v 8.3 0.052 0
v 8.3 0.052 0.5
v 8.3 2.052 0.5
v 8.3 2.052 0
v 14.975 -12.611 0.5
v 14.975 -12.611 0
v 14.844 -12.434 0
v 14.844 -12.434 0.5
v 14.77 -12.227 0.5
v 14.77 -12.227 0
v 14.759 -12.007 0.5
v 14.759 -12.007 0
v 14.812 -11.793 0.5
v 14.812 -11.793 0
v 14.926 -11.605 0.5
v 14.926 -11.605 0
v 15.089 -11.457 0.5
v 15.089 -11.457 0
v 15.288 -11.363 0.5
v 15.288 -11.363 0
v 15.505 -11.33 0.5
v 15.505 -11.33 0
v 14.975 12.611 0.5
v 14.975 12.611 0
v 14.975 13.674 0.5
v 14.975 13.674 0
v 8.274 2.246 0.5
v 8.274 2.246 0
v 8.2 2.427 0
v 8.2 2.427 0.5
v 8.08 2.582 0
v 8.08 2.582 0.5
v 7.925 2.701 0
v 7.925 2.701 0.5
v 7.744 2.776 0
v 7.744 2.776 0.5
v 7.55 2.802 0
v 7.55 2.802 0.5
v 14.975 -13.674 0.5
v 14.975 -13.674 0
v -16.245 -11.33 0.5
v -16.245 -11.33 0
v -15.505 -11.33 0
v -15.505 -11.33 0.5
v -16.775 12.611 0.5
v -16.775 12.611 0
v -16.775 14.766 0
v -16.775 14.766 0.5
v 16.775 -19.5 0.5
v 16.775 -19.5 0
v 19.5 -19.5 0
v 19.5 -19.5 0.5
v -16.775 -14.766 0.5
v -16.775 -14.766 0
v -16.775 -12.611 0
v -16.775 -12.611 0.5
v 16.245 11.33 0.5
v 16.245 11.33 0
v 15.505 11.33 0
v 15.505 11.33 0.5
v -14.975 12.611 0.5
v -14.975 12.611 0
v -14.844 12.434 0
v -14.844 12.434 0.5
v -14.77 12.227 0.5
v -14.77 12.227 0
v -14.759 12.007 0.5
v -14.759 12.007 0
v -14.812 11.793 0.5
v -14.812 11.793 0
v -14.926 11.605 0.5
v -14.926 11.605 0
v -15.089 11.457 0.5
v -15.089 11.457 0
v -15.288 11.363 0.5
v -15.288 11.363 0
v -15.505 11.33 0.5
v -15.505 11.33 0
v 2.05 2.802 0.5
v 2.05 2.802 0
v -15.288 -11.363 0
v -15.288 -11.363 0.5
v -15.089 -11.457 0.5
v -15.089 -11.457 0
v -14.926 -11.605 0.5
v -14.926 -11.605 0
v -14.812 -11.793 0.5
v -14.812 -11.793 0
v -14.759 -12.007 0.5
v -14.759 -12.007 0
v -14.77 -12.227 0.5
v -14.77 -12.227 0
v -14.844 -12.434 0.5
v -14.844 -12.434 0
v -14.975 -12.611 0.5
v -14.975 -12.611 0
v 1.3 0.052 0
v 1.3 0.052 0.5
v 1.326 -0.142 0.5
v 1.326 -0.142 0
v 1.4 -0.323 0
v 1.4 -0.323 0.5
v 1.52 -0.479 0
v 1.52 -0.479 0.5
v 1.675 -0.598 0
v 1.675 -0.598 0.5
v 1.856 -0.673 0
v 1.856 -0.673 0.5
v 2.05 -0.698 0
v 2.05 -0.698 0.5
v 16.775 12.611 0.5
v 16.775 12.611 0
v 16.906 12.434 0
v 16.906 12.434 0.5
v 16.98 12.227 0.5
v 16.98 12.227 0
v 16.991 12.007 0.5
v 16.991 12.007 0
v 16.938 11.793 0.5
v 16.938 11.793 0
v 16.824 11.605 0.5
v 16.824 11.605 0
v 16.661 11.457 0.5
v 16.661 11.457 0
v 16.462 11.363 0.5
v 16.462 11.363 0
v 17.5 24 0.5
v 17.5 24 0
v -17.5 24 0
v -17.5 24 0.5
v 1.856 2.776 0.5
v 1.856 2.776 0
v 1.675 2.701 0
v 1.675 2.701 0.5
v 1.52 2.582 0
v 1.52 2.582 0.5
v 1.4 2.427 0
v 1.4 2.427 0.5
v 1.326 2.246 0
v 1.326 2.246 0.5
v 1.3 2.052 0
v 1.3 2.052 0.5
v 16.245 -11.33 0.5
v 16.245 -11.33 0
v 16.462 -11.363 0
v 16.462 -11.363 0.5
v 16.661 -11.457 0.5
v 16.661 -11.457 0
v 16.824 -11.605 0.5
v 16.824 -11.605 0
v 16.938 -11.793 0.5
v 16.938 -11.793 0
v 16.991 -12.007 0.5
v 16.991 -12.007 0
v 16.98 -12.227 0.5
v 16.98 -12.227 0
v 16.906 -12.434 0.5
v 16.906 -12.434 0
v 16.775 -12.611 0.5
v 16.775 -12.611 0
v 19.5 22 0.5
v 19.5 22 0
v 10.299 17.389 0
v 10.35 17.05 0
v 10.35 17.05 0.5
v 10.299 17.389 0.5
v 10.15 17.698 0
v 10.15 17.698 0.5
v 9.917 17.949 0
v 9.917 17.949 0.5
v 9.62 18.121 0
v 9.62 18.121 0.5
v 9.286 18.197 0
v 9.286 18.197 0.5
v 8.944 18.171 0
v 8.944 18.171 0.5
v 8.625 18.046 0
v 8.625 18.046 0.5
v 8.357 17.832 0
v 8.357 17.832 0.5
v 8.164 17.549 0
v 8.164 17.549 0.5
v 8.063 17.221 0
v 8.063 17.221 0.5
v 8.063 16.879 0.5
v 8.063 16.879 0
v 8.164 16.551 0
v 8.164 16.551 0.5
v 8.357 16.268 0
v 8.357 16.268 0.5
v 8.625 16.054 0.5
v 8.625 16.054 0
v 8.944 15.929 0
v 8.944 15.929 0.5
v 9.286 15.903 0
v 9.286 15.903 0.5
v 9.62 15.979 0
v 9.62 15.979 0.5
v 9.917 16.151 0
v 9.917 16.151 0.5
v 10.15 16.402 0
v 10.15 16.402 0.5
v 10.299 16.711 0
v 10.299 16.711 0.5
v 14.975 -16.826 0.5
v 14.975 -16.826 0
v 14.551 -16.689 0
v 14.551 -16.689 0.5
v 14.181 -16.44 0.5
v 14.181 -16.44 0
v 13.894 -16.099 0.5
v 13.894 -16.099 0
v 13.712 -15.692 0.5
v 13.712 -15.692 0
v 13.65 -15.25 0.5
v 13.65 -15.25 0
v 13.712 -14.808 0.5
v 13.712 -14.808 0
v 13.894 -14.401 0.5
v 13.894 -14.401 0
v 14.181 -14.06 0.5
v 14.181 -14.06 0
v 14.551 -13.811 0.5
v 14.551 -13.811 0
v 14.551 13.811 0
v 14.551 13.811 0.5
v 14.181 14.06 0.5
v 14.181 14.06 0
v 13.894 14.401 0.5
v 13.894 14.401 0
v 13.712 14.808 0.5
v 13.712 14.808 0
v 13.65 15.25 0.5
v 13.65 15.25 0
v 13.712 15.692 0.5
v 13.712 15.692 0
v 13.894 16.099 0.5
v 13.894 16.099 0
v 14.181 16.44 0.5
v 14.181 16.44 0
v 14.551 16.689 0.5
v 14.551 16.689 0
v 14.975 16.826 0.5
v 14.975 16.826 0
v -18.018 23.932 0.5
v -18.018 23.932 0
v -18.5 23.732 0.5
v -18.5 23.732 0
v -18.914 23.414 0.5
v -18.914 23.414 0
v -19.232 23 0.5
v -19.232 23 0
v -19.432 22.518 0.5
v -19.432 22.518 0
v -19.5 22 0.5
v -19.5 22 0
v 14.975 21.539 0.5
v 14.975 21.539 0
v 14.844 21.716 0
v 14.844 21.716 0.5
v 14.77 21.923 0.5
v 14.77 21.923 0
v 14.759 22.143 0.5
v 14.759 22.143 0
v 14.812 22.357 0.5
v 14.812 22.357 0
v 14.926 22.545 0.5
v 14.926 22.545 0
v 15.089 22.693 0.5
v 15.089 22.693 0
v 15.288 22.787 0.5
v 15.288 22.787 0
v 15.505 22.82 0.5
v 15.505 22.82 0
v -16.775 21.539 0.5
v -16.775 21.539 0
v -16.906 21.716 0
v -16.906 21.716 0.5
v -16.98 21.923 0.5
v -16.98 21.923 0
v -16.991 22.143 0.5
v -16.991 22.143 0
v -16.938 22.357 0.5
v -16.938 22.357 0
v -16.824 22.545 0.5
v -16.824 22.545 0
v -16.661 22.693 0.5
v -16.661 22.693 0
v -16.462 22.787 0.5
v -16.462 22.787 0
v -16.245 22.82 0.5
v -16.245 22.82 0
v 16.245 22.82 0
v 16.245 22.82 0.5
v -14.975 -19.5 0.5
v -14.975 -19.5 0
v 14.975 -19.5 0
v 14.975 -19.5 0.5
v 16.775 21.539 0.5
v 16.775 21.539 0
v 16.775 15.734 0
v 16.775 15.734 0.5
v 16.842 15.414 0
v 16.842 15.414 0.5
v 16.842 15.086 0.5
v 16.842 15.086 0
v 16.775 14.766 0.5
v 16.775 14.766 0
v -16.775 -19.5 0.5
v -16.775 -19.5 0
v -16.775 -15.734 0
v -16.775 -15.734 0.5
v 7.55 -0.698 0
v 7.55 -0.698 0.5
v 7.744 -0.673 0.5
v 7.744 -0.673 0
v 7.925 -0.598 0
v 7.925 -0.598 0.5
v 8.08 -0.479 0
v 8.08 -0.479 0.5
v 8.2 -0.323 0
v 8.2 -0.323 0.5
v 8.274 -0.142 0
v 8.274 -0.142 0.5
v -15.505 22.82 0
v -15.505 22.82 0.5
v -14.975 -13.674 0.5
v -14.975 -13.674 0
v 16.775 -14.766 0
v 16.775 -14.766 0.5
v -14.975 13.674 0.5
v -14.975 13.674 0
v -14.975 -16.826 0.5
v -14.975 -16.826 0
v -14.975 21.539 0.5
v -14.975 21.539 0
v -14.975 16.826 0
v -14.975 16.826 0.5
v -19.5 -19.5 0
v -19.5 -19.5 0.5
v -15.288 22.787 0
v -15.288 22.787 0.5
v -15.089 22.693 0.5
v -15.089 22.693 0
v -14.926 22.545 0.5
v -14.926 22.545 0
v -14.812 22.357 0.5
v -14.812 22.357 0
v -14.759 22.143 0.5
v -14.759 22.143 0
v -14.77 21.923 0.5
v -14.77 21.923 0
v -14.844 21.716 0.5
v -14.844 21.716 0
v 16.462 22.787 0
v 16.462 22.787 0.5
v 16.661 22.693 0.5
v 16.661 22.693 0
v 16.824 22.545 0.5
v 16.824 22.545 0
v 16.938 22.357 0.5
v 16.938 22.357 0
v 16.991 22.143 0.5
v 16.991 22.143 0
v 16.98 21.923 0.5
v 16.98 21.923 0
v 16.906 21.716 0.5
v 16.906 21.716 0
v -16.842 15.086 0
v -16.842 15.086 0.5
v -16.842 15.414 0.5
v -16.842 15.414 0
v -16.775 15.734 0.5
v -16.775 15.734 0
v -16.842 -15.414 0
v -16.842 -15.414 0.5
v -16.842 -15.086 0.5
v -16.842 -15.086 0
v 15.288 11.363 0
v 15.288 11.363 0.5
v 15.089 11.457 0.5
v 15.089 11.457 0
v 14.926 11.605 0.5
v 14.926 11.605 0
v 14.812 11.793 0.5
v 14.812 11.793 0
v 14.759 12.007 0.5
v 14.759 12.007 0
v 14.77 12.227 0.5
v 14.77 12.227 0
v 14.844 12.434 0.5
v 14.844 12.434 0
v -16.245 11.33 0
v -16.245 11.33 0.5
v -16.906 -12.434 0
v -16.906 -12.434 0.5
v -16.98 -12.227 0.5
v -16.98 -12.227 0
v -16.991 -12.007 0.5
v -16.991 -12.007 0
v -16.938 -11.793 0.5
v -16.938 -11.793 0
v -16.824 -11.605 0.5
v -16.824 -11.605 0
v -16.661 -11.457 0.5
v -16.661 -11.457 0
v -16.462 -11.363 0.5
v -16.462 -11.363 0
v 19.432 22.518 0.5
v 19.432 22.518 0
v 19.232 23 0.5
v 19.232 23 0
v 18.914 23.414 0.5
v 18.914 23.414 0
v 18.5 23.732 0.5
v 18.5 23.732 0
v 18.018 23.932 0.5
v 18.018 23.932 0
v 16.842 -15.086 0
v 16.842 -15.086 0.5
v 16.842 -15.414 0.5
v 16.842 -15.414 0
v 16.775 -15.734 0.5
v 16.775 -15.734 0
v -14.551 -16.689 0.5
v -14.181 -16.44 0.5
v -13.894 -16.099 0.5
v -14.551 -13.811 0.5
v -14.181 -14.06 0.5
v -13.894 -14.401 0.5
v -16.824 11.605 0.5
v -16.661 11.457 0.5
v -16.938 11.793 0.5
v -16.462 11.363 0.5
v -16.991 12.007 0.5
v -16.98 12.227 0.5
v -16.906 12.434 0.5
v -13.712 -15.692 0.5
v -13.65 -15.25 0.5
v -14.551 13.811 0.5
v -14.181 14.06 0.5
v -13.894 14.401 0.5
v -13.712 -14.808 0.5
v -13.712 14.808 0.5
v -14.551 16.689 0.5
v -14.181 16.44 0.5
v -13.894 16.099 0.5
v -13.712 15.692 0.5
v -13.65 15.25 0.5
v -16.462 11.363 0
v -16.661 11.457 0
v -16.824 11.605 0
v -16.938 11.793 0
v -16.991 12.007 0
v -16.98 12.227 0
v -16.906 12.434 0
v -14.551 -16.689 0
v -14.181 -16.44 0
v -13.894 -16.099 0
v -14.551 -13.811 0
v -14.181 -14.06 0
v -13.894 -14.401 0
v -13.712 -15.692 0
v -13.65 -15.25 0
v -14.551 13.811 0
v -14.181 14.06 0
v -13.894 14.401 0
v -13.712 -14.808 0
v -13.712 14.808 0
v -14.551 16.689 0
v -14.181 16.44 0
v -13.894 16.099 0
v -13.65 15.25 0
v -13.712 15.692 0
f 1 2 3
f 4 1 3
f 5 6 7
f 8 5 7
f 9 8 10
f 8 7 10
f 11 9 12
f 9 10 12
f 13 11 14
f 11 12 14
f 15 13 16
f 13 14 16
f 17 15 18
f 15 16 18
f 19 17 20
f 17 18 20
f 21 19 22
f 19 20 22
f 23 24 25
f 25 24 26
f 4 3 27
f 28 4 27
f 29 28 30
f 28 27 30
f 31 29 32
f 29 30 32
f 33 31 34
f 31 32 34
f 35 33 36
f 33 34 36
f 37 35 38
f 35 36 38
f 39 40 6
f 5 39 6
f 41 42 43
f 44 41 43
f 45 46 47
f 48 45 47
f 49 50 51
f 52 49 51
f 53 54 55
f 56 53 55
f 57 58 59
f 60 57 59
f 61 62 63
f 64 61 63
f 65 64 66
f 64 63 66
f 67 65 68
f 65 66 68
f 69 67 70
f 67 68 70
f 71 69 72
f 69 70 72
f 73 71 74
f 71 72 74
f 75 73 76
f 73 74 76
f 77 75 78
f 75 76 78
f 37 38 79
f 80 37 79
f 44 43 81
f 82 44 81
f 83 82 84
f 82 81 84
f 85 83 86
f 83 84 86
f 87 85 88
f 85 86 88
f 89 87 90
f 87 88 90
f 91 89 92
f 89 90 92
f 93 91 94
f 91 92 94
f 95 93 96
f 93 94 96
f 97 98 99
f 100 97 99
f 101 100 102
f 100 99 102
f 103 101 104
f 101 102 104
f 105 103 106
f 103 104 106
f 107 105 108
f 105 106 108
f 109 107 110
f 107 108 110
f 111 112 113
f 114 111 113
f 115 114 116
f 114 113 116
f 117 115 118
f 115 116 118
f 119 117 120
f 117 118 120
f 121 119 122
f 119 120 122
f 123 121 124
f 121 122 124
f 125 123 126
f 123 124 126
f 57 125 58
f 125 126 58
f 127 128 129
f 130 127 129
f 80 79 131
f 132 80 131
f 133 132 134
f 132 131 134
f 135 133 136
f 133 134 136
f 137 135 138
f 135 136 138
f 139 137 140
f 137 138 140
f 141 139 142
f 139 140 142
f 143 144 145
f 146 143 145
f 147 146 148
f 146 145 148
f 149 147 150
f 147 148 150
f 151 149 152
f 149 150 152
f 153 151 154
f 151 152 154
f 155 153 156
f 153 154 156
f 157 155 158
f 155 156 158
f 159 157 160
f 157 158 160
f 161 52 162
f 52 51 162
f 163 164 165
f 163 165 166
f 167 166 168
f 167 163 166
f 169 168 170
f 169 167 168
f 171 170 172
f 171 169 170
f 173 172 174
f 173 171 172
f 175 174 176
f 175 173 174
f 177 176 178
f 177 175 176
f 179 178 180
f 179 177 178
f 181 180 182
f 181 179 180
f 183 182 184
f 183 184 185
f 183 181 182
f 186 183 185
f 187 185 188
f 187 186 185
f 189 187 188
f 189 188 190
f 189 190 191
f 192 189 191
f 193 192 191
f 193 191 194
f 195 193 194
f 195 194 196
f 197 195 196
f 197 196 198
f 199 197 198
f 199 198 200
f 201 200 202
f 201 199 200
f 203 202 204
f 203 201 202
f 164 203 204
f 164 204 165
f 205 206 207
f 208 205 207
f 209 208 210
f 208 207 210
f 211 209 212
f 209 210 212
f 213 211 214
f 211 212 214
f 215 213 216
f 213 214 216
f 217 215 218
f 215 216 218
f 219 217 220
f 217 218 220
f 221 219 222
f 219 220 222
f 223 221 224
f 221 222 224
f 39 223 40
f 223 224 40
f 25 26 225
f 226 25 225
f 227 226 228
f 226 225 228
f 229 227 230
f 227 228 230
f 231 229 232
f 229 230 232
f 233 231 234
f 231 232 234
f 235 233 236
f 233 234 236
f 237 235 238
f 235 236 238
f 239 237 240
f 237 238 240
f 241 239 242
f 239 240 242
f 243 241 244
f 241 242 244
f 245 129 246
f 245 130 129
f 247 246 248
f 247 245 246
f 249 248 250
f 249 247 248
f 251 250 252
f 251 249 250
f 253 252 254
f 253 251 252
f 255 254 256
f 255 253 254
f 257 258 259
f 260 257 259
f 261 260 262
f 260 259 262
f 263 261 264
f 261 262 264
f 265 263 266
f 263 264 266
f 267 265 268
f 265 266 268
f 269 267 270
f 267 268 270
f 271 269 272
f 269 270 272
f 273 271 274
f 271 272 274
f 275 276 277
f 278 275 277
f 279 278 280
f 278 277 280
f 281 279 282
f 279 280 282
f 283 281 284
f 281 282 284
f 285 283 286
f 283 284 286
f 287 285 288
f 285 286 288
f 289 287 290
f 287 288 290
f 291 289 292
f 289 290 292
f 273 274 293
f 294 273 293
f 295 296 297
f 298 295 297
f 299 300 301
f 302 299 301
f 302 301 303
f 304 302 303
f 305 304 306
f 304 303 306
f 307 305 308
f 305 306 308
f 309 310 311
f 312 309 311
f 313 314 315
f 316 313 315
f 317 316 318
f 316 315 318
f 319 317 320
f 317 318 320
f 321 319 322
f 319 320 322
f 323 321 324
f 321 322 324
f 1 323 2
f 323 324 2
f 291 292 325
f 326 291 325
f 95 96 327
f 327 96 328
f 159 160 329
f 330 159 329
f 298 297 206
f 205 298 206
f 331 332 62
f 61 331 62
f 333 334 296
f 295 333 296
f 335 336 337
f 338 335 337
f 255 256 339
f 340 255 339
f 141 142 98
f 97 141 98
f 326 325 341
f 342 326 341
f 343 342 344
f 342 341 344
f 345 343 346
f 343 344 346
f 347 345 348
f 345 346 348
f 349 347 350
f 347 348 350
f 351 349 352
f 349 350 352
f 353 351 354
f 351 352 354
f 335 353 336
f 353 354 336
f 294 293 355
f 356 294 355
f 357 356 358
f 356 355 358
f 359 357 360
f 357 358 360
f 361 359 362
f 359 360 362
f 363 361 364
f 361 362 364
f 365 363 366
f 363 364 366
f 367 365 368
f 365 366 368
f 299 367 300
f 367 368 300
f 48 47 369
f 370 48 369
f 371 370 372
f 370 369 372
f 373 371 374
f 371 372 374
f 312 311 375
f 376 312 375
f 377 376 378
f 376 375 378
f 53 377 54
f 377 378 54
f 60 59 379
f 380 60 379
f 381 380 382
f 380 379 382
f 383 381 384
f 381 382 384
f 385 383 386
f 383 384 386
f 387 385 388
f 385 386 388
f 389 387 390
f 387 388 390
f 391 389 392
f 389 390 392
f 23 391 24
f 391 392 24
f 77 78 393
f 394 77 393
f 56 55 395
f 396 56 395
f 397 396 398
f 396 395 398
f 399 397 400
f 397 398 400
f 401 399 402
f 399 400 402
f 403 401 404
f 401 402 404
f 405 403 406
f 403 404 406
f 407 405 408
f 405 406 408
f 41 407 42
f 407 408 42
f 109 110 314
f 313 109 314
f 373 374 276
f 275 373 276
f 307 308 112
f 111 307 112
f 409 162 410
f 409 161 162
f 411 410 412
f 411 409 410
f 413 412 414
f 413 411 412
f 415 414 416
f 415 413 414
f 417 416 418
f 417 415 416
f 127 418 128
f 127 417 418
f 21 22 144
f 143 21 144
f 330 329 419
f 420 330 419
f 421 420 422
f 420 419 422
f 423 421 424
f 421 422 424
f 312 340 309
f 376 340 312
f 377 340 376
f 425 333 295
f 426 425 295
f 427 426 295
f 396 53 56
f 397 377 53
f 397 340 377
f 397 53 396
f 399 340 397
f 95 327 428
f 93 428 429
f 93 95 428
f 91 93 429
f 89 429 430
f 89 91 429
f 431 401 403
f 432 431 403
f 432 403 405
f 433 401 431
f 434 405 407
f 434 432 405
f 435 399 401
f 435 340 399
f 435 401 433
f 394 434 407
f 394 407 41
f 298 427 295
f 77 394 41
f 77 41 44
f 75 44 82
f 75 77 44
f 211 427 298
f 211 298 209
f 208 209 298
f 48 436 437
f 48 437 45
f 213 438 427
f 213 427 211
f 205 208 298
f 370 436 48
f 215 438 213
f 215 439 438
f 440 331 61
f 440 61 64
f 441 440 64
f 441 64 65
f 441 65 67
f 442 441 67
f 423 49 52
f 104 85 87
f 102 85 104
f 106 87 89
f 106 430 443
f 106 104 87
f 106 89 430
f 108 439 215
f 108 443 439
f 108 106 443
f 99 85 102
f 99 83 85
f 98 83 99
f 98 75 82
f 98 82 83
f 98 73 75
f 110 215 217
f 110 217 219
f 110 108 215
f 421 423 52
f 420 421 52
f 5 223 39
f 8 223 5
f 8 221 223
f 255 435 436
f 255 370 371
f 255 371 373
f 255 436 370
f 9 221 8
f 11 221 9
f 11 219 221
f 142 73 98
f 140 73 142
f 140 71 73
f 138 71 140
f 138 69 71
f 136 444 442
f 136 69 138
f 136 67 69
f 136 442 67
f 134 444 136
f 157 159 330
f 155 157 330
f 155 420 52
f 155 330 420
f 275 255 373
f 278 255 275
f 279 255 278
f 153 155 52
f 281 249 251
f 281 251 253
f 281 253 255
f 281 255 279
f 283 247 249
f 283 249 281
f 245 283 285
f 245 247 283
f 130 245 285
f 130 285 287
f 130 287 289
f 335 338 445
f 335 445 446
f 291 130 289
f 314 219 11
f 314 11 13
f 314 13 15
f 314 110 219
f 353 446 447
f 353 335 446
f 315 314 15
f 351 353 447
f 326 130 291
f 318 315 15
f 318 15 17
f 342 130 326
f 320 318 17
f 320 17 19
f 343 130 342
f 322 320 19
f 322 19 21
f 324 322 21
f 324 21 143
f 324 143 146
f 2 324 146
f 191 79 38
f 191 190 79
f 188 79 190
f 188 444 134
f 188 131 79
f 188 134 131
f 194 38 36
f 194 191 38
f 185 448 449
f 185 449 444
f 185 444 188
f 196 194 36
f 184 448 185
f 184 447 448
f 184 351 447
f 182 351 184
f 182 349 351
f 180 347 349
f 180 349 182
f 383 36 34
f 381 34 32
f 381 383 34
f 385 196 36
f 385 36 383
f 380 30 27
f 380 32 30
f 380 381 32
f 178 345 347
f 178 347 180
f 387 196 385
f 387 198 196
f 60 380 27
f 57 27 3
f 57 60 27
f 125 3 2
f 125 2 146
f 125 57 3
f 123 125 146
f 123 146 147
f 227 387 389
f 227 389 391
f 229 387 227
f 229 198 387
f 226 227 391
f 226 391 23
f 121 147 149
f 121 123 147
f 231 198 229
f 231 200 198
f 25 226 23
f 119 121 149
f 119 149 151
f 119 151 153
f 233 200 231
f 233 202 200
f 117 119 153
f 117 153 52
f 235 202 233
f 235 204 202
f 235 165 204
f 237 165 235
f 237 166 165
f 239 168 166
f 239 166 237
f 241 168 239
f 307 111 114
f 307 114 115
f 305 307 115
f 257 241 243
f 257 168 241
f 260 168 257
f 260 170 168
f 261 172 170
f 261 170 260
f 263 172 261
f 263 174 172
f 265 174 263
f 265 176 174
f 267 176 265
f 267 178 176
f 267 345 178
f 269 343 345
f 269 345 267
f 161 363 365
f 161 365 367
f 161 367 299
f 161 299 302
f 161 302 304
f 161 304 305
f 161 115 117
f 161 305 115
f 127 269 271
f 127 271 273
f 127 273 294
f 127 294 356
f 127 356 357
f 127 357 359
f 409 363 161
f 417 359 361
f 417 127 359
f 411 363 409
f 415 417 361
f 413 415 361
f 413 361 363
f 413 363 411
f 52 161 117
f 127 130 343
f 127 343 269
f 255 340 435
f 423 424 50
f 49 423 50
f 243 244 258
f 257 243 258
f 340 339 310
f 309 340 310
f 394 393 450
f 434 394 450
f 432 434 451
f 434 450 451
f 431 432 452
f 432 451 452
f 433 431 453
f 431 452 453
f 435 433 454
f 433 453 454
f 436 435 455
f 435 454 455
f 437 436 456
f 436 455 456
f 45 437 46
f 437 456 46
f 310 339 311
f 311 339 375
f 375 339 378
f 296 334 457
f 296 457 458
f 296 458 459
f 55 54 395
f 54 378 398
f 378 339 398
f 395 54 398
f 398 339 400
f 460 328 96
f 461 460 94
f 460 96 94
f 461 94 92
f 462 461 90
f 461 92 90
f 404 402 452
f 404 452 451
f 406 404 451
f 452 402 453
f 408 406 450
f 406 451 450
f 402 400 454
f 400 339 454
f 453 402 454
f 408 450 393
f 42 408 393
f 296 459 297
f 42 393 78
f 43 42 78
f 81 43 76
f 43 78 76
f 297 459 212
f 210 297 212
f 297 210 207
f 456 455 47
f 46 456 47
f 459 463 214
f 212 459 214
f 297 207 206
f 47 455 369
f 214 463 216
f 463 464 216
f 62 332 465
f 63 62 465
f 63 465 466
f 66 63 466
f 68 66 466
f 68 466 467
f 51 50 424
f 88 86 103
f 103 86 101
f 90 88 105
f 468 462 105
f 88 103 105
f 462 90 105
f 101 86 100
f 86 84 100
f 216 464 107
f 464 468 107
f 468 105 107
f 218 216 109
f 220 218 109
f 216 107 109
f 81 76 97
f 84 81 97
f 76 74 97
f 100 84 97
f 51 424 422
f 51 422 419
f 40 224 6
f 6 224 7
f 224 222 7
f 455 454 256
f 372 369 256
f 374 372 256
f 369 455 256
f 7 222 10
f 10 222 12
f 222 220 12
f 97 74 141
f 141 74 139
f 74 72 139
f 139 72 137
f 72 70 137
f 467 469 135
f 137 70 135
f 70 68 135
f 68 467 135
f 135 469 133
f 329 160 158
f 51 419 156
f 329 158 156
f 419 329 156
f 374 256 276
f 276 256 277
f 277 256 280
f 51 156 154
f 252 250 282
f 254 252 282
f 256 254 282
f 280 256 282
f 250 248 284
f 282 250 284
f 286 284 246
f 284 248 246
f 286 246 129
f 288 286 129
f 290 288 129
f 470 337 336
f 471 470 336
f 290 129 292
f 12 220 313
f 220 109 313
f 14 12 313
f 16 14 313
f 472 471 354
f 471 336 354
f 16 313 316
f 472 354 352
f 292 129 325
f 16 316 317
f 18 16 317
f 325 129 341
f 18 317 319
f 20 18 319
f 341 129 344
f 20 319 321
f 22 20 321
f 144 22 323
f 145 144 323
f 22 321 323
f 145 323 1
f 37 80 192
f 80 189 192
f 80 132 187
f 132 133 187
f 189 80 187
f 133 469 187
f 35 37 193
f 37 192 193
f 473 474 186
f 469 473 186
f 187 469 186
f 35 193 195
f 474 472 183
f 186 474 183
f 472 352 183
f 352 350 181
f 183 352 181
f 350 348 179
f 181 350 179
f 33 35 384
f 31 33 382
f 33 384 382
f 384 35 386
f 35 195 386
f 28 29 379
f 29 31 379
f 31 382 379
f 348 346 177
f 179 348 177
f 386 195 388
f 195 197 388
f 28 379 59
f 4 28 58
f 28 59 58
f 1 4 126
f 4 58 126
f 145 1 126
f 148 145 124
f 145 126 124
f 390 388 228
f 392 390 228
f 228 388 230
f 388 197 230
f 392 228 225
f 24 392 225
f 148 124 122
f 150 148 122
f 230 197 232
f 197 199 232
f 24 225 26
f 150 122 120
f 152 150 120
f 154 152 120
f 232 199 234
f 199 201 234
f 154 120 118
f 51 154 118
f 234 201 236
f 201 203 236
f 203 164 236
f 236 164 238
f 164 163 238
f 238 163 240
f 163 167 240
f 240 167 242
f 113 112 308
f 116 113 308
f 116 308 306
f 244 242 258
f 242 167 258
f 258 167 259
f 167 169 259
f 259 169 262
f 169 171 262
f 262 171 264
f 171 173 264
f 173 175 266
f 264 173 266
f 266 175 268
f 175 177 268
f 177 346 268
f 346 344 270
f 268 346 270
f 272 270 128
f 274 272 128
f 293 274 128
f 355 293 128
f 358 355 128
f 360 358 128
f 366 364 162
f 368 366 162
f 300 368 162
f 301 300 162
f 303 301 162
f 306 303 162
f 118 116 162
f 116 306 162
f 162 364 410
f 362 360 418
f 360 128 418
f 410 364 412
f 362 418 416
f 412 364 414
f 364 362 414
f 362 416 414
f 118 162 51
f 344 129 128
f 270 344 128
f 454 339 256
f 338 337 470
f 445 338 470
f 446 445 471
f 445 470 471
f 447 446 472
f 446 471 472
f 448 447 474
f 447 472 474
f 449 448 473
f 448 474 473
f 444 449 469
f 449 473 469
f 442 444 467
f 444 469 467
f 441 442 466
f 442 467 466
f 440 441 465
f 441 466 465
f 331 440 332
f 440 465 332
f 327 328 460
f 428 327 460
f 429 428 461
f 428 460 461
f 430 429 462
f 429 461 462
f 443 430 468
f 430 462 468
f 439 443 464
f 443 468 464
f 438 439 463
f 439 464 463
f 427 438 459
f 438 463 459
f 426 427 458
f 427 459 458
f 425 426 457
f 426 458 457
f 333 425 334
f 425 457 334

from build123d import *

# Parameters (mm, degrees)
SKETCH1_R                   = 1.15
SHAPE_DEPTH                 = 0.5
CAMERA_CONNECTOR_HOLE_REACH = 32.927
FILLET1_R                   = 2


with BuildPart() as part:
    # Sketch1 → Shape (new body)
    with BuildSketch(Plane.XY):
        with BuildLine():
            Line((19.5, 24), (-19.5, 24))
            Line((-19.5, 24), (-19.5, -19.5))
            Line((-19.5, -19.5), (-16.775, -19.5))
            Line((-16.775, -19.5), (-16.775, -15.734122918))
            ThreePointArc((-16.775, -15.734122918), (-16.85, -15.25), (-16.775, -14.765877082))
            Line((-16.775, -14.765877082), (-16.775, -12.610660172))
            ThreePointArc((-16.775, -12.610660172), (-16.937579563, -11.793317512), (-16.244669914, -11.330330086))
            Line((-16.244669914, -11.330330086), (-15.505330086, -11.330330086))
            ThreePointArc((-15.505330086, -11.330330086), (-14.812420437, -11.793317512), (-14.975, -12.610660172))
            Line((-14.975, -12.610660172), (-14.975, -13.673809973))
            ThreePointArc((-14.975, -13.673809973), (-13.65, -15.25), (-14.975, -16.826190027))
            Line((-14.975, -16.826190027), (-14.975, -19.5))
            Line((-14.975, -19.5), (14.975, -19.5))
            Line((14.975, -19.5), (14.975, -16.826190027))
            ThreePointArc((14.975, -16.826190027), (13.65, -15.25), (14.975, -13.673809973))
            Line((14.975, -13.673809973), (14.975, -12.610660172))
            ThreePointArc((14.975, -12.610660172), (14.812420437, -11.793317512), (15.505330086, -11.330330086))
            Line((15.505330086, -11.330330086), (16.244669914, -11.330330086))
            ThreePointArc((16.244669914, -11.330330086), (16.937579563, -11.793317512), (16.775, -12.610660172))
            Line((16.775, -12.610660172), (16.775, -14.765877082))
            ThreePointArc((16.775, -14.765877082), (16.85, -15.25), (16.775, -15.734122918))
            Line((16.775, -15.734122918), (16.775, -19.5))
            Line((16.775, -19.5), (19.5, -19.5))
            Line((19.5, -19.5), (19.5, 24))
        make_face()
        with BuildLine():
            ThreePointArc((16.244669914, 22.819669914), (16.937579563, 22.356682488), (16.775, 21.539339828))
            Line((16.775, 21.539339828), (16.775, 15.734122918))
            ThreePointArc((16.775, 15.734122918), (16.85, 15.25), (16.775, 14.765877082))
            Line((16.775, 14.765877082), (16.775, 12.610660172))
            ThreePointArc((16.775, 12.610660172), (16.937579563, 11.793317512), (16.244669914, 11.330330086))
            Line((16.244669914, 11.330330086), (15.505330086, 11.330330086))
            ThreePointArc((15.505330086, 11.330330086), (14.812420437, 11.793317512), (14.975, 12.610660172))
            Line((14.975, 12.610660172), (14.975, 13.673809973))
            ThreePointArc((14.975, 13.673809973), (13.65, 15.25), (14.975, 16.826190027))
            Line((14.975, 16.826190027), (14.975, 21.539339828))
            ThreePointArc((14.975, 21.539339828), (14.812420437, 22.356682488), (15.505330086, 22.819669914))
            Line((15.505330086, 22.819669914), (16.244669914, 22.819669914))
        make_face(mode=Mode.SUBTRACT)
        with BuildLine():
            Line((-16.775, 12.610660172), (-16.775, 14.765877082))
            ThreePointArc((-16.775, 14.765877082), (-16.85, 15.25), (-16.775, 15.734122918))
            Line((-16.775, 15.734122918), (-16.775, 21.539339828))
            ThreePointArc((-16.775, 21.539339828), (-16.937579563, 22.356682488), (-16.244669914, 22.819669914))
            Line((-16.244669914, 22.819669914), (-15.505330086, 22.819669914))
            ThreePointArc((-15.505330086, 22.819669914), (-14.812420437, 22.356682488), (-14.975, 21.539339828))
            Line((-14.975, 21.539339828), (-14.975, 16.826190027))
            ThreePointArc((-14.975, 16.826190027), (-13.65, 15.25), (-14.975, 13.673809973))
            Line((-14.975, 13.673809973), (-14.975, 12.610660172))
            ThreePointArc((-14.975, 12.610660172), (-14.812420437, 11.793317512), (-15.505330086, 11.330330086))
            Line((-15.505330086, 11.330330086), (-16.244669914, 11.330330086))
            ThreePointArc((-16.244669914, 11.330330086), (-16.937579563, 11.793317512), (-16.775, 12.610660172))
        make_face(mode=Mode.SUBTRACT)
        with Locations((9.2, 17.05)):
            Circle(SKETCH1_R, mode=Mode.SUBTRACT)
    extrude(amount=SHAPE_DEPTH)

    # Sketch2 → Camera connector hole (cut, up to next)
    with BuildSketch(Plane.XY.offset(0.5), mode=Mode.PRIVATE) as camera_connector_hole_sk1:
        with BuildLine():
            ThreePointArc((1.3, 0.051822129), (1.519669914, -0.478507957), (2.05, -0.698177871))
            Line((2.05, -0.698177871), (7.55, -0.698177871))
            ThreePointArc((7.55, -0.698177871), (8.080330086, -0.478507957), (8.3, 0.051822129))
            Line((8.3, 0.051822129), (8.3, 2.051822129))
            ThreePointArc((8.3, 2.051822129), (8.080330086, 2.582152215), (7.55, 2.801822129))
            Line((7.55, 2.801822129), (2.05, 2.801822129))
            ThreePointArc((2.05, 2.801822129), (1.519669914, 2.582152215), (1.3, 2.051822129))
            Line((1.3, 2.051822129), (1.3, 0.051822129))
        make_face()
    camera_connector_hole_tool1 = extrude(camera_connector_hole_sk1.sketch, amount=-CAMERA_CONNECTOR_HOLE_REACH, mode=Mode.PRIVATE) & part.part
    add(camera_connector_hole_tool1.solids().sort_by_distance((4.8, 1.051822, 0.5))[0], mode=Mode.SUBTRACT)

    # Fillet1
    fillet1_edges = [part.edges().sort_by_distance(p)[0] for p in [
        (19.5, 24, 0.25),
        (-19.5, 24, 0.25),
    ]]
    fillet(fillet1_edges, radius=FILLET1_R)


solid = part.part
